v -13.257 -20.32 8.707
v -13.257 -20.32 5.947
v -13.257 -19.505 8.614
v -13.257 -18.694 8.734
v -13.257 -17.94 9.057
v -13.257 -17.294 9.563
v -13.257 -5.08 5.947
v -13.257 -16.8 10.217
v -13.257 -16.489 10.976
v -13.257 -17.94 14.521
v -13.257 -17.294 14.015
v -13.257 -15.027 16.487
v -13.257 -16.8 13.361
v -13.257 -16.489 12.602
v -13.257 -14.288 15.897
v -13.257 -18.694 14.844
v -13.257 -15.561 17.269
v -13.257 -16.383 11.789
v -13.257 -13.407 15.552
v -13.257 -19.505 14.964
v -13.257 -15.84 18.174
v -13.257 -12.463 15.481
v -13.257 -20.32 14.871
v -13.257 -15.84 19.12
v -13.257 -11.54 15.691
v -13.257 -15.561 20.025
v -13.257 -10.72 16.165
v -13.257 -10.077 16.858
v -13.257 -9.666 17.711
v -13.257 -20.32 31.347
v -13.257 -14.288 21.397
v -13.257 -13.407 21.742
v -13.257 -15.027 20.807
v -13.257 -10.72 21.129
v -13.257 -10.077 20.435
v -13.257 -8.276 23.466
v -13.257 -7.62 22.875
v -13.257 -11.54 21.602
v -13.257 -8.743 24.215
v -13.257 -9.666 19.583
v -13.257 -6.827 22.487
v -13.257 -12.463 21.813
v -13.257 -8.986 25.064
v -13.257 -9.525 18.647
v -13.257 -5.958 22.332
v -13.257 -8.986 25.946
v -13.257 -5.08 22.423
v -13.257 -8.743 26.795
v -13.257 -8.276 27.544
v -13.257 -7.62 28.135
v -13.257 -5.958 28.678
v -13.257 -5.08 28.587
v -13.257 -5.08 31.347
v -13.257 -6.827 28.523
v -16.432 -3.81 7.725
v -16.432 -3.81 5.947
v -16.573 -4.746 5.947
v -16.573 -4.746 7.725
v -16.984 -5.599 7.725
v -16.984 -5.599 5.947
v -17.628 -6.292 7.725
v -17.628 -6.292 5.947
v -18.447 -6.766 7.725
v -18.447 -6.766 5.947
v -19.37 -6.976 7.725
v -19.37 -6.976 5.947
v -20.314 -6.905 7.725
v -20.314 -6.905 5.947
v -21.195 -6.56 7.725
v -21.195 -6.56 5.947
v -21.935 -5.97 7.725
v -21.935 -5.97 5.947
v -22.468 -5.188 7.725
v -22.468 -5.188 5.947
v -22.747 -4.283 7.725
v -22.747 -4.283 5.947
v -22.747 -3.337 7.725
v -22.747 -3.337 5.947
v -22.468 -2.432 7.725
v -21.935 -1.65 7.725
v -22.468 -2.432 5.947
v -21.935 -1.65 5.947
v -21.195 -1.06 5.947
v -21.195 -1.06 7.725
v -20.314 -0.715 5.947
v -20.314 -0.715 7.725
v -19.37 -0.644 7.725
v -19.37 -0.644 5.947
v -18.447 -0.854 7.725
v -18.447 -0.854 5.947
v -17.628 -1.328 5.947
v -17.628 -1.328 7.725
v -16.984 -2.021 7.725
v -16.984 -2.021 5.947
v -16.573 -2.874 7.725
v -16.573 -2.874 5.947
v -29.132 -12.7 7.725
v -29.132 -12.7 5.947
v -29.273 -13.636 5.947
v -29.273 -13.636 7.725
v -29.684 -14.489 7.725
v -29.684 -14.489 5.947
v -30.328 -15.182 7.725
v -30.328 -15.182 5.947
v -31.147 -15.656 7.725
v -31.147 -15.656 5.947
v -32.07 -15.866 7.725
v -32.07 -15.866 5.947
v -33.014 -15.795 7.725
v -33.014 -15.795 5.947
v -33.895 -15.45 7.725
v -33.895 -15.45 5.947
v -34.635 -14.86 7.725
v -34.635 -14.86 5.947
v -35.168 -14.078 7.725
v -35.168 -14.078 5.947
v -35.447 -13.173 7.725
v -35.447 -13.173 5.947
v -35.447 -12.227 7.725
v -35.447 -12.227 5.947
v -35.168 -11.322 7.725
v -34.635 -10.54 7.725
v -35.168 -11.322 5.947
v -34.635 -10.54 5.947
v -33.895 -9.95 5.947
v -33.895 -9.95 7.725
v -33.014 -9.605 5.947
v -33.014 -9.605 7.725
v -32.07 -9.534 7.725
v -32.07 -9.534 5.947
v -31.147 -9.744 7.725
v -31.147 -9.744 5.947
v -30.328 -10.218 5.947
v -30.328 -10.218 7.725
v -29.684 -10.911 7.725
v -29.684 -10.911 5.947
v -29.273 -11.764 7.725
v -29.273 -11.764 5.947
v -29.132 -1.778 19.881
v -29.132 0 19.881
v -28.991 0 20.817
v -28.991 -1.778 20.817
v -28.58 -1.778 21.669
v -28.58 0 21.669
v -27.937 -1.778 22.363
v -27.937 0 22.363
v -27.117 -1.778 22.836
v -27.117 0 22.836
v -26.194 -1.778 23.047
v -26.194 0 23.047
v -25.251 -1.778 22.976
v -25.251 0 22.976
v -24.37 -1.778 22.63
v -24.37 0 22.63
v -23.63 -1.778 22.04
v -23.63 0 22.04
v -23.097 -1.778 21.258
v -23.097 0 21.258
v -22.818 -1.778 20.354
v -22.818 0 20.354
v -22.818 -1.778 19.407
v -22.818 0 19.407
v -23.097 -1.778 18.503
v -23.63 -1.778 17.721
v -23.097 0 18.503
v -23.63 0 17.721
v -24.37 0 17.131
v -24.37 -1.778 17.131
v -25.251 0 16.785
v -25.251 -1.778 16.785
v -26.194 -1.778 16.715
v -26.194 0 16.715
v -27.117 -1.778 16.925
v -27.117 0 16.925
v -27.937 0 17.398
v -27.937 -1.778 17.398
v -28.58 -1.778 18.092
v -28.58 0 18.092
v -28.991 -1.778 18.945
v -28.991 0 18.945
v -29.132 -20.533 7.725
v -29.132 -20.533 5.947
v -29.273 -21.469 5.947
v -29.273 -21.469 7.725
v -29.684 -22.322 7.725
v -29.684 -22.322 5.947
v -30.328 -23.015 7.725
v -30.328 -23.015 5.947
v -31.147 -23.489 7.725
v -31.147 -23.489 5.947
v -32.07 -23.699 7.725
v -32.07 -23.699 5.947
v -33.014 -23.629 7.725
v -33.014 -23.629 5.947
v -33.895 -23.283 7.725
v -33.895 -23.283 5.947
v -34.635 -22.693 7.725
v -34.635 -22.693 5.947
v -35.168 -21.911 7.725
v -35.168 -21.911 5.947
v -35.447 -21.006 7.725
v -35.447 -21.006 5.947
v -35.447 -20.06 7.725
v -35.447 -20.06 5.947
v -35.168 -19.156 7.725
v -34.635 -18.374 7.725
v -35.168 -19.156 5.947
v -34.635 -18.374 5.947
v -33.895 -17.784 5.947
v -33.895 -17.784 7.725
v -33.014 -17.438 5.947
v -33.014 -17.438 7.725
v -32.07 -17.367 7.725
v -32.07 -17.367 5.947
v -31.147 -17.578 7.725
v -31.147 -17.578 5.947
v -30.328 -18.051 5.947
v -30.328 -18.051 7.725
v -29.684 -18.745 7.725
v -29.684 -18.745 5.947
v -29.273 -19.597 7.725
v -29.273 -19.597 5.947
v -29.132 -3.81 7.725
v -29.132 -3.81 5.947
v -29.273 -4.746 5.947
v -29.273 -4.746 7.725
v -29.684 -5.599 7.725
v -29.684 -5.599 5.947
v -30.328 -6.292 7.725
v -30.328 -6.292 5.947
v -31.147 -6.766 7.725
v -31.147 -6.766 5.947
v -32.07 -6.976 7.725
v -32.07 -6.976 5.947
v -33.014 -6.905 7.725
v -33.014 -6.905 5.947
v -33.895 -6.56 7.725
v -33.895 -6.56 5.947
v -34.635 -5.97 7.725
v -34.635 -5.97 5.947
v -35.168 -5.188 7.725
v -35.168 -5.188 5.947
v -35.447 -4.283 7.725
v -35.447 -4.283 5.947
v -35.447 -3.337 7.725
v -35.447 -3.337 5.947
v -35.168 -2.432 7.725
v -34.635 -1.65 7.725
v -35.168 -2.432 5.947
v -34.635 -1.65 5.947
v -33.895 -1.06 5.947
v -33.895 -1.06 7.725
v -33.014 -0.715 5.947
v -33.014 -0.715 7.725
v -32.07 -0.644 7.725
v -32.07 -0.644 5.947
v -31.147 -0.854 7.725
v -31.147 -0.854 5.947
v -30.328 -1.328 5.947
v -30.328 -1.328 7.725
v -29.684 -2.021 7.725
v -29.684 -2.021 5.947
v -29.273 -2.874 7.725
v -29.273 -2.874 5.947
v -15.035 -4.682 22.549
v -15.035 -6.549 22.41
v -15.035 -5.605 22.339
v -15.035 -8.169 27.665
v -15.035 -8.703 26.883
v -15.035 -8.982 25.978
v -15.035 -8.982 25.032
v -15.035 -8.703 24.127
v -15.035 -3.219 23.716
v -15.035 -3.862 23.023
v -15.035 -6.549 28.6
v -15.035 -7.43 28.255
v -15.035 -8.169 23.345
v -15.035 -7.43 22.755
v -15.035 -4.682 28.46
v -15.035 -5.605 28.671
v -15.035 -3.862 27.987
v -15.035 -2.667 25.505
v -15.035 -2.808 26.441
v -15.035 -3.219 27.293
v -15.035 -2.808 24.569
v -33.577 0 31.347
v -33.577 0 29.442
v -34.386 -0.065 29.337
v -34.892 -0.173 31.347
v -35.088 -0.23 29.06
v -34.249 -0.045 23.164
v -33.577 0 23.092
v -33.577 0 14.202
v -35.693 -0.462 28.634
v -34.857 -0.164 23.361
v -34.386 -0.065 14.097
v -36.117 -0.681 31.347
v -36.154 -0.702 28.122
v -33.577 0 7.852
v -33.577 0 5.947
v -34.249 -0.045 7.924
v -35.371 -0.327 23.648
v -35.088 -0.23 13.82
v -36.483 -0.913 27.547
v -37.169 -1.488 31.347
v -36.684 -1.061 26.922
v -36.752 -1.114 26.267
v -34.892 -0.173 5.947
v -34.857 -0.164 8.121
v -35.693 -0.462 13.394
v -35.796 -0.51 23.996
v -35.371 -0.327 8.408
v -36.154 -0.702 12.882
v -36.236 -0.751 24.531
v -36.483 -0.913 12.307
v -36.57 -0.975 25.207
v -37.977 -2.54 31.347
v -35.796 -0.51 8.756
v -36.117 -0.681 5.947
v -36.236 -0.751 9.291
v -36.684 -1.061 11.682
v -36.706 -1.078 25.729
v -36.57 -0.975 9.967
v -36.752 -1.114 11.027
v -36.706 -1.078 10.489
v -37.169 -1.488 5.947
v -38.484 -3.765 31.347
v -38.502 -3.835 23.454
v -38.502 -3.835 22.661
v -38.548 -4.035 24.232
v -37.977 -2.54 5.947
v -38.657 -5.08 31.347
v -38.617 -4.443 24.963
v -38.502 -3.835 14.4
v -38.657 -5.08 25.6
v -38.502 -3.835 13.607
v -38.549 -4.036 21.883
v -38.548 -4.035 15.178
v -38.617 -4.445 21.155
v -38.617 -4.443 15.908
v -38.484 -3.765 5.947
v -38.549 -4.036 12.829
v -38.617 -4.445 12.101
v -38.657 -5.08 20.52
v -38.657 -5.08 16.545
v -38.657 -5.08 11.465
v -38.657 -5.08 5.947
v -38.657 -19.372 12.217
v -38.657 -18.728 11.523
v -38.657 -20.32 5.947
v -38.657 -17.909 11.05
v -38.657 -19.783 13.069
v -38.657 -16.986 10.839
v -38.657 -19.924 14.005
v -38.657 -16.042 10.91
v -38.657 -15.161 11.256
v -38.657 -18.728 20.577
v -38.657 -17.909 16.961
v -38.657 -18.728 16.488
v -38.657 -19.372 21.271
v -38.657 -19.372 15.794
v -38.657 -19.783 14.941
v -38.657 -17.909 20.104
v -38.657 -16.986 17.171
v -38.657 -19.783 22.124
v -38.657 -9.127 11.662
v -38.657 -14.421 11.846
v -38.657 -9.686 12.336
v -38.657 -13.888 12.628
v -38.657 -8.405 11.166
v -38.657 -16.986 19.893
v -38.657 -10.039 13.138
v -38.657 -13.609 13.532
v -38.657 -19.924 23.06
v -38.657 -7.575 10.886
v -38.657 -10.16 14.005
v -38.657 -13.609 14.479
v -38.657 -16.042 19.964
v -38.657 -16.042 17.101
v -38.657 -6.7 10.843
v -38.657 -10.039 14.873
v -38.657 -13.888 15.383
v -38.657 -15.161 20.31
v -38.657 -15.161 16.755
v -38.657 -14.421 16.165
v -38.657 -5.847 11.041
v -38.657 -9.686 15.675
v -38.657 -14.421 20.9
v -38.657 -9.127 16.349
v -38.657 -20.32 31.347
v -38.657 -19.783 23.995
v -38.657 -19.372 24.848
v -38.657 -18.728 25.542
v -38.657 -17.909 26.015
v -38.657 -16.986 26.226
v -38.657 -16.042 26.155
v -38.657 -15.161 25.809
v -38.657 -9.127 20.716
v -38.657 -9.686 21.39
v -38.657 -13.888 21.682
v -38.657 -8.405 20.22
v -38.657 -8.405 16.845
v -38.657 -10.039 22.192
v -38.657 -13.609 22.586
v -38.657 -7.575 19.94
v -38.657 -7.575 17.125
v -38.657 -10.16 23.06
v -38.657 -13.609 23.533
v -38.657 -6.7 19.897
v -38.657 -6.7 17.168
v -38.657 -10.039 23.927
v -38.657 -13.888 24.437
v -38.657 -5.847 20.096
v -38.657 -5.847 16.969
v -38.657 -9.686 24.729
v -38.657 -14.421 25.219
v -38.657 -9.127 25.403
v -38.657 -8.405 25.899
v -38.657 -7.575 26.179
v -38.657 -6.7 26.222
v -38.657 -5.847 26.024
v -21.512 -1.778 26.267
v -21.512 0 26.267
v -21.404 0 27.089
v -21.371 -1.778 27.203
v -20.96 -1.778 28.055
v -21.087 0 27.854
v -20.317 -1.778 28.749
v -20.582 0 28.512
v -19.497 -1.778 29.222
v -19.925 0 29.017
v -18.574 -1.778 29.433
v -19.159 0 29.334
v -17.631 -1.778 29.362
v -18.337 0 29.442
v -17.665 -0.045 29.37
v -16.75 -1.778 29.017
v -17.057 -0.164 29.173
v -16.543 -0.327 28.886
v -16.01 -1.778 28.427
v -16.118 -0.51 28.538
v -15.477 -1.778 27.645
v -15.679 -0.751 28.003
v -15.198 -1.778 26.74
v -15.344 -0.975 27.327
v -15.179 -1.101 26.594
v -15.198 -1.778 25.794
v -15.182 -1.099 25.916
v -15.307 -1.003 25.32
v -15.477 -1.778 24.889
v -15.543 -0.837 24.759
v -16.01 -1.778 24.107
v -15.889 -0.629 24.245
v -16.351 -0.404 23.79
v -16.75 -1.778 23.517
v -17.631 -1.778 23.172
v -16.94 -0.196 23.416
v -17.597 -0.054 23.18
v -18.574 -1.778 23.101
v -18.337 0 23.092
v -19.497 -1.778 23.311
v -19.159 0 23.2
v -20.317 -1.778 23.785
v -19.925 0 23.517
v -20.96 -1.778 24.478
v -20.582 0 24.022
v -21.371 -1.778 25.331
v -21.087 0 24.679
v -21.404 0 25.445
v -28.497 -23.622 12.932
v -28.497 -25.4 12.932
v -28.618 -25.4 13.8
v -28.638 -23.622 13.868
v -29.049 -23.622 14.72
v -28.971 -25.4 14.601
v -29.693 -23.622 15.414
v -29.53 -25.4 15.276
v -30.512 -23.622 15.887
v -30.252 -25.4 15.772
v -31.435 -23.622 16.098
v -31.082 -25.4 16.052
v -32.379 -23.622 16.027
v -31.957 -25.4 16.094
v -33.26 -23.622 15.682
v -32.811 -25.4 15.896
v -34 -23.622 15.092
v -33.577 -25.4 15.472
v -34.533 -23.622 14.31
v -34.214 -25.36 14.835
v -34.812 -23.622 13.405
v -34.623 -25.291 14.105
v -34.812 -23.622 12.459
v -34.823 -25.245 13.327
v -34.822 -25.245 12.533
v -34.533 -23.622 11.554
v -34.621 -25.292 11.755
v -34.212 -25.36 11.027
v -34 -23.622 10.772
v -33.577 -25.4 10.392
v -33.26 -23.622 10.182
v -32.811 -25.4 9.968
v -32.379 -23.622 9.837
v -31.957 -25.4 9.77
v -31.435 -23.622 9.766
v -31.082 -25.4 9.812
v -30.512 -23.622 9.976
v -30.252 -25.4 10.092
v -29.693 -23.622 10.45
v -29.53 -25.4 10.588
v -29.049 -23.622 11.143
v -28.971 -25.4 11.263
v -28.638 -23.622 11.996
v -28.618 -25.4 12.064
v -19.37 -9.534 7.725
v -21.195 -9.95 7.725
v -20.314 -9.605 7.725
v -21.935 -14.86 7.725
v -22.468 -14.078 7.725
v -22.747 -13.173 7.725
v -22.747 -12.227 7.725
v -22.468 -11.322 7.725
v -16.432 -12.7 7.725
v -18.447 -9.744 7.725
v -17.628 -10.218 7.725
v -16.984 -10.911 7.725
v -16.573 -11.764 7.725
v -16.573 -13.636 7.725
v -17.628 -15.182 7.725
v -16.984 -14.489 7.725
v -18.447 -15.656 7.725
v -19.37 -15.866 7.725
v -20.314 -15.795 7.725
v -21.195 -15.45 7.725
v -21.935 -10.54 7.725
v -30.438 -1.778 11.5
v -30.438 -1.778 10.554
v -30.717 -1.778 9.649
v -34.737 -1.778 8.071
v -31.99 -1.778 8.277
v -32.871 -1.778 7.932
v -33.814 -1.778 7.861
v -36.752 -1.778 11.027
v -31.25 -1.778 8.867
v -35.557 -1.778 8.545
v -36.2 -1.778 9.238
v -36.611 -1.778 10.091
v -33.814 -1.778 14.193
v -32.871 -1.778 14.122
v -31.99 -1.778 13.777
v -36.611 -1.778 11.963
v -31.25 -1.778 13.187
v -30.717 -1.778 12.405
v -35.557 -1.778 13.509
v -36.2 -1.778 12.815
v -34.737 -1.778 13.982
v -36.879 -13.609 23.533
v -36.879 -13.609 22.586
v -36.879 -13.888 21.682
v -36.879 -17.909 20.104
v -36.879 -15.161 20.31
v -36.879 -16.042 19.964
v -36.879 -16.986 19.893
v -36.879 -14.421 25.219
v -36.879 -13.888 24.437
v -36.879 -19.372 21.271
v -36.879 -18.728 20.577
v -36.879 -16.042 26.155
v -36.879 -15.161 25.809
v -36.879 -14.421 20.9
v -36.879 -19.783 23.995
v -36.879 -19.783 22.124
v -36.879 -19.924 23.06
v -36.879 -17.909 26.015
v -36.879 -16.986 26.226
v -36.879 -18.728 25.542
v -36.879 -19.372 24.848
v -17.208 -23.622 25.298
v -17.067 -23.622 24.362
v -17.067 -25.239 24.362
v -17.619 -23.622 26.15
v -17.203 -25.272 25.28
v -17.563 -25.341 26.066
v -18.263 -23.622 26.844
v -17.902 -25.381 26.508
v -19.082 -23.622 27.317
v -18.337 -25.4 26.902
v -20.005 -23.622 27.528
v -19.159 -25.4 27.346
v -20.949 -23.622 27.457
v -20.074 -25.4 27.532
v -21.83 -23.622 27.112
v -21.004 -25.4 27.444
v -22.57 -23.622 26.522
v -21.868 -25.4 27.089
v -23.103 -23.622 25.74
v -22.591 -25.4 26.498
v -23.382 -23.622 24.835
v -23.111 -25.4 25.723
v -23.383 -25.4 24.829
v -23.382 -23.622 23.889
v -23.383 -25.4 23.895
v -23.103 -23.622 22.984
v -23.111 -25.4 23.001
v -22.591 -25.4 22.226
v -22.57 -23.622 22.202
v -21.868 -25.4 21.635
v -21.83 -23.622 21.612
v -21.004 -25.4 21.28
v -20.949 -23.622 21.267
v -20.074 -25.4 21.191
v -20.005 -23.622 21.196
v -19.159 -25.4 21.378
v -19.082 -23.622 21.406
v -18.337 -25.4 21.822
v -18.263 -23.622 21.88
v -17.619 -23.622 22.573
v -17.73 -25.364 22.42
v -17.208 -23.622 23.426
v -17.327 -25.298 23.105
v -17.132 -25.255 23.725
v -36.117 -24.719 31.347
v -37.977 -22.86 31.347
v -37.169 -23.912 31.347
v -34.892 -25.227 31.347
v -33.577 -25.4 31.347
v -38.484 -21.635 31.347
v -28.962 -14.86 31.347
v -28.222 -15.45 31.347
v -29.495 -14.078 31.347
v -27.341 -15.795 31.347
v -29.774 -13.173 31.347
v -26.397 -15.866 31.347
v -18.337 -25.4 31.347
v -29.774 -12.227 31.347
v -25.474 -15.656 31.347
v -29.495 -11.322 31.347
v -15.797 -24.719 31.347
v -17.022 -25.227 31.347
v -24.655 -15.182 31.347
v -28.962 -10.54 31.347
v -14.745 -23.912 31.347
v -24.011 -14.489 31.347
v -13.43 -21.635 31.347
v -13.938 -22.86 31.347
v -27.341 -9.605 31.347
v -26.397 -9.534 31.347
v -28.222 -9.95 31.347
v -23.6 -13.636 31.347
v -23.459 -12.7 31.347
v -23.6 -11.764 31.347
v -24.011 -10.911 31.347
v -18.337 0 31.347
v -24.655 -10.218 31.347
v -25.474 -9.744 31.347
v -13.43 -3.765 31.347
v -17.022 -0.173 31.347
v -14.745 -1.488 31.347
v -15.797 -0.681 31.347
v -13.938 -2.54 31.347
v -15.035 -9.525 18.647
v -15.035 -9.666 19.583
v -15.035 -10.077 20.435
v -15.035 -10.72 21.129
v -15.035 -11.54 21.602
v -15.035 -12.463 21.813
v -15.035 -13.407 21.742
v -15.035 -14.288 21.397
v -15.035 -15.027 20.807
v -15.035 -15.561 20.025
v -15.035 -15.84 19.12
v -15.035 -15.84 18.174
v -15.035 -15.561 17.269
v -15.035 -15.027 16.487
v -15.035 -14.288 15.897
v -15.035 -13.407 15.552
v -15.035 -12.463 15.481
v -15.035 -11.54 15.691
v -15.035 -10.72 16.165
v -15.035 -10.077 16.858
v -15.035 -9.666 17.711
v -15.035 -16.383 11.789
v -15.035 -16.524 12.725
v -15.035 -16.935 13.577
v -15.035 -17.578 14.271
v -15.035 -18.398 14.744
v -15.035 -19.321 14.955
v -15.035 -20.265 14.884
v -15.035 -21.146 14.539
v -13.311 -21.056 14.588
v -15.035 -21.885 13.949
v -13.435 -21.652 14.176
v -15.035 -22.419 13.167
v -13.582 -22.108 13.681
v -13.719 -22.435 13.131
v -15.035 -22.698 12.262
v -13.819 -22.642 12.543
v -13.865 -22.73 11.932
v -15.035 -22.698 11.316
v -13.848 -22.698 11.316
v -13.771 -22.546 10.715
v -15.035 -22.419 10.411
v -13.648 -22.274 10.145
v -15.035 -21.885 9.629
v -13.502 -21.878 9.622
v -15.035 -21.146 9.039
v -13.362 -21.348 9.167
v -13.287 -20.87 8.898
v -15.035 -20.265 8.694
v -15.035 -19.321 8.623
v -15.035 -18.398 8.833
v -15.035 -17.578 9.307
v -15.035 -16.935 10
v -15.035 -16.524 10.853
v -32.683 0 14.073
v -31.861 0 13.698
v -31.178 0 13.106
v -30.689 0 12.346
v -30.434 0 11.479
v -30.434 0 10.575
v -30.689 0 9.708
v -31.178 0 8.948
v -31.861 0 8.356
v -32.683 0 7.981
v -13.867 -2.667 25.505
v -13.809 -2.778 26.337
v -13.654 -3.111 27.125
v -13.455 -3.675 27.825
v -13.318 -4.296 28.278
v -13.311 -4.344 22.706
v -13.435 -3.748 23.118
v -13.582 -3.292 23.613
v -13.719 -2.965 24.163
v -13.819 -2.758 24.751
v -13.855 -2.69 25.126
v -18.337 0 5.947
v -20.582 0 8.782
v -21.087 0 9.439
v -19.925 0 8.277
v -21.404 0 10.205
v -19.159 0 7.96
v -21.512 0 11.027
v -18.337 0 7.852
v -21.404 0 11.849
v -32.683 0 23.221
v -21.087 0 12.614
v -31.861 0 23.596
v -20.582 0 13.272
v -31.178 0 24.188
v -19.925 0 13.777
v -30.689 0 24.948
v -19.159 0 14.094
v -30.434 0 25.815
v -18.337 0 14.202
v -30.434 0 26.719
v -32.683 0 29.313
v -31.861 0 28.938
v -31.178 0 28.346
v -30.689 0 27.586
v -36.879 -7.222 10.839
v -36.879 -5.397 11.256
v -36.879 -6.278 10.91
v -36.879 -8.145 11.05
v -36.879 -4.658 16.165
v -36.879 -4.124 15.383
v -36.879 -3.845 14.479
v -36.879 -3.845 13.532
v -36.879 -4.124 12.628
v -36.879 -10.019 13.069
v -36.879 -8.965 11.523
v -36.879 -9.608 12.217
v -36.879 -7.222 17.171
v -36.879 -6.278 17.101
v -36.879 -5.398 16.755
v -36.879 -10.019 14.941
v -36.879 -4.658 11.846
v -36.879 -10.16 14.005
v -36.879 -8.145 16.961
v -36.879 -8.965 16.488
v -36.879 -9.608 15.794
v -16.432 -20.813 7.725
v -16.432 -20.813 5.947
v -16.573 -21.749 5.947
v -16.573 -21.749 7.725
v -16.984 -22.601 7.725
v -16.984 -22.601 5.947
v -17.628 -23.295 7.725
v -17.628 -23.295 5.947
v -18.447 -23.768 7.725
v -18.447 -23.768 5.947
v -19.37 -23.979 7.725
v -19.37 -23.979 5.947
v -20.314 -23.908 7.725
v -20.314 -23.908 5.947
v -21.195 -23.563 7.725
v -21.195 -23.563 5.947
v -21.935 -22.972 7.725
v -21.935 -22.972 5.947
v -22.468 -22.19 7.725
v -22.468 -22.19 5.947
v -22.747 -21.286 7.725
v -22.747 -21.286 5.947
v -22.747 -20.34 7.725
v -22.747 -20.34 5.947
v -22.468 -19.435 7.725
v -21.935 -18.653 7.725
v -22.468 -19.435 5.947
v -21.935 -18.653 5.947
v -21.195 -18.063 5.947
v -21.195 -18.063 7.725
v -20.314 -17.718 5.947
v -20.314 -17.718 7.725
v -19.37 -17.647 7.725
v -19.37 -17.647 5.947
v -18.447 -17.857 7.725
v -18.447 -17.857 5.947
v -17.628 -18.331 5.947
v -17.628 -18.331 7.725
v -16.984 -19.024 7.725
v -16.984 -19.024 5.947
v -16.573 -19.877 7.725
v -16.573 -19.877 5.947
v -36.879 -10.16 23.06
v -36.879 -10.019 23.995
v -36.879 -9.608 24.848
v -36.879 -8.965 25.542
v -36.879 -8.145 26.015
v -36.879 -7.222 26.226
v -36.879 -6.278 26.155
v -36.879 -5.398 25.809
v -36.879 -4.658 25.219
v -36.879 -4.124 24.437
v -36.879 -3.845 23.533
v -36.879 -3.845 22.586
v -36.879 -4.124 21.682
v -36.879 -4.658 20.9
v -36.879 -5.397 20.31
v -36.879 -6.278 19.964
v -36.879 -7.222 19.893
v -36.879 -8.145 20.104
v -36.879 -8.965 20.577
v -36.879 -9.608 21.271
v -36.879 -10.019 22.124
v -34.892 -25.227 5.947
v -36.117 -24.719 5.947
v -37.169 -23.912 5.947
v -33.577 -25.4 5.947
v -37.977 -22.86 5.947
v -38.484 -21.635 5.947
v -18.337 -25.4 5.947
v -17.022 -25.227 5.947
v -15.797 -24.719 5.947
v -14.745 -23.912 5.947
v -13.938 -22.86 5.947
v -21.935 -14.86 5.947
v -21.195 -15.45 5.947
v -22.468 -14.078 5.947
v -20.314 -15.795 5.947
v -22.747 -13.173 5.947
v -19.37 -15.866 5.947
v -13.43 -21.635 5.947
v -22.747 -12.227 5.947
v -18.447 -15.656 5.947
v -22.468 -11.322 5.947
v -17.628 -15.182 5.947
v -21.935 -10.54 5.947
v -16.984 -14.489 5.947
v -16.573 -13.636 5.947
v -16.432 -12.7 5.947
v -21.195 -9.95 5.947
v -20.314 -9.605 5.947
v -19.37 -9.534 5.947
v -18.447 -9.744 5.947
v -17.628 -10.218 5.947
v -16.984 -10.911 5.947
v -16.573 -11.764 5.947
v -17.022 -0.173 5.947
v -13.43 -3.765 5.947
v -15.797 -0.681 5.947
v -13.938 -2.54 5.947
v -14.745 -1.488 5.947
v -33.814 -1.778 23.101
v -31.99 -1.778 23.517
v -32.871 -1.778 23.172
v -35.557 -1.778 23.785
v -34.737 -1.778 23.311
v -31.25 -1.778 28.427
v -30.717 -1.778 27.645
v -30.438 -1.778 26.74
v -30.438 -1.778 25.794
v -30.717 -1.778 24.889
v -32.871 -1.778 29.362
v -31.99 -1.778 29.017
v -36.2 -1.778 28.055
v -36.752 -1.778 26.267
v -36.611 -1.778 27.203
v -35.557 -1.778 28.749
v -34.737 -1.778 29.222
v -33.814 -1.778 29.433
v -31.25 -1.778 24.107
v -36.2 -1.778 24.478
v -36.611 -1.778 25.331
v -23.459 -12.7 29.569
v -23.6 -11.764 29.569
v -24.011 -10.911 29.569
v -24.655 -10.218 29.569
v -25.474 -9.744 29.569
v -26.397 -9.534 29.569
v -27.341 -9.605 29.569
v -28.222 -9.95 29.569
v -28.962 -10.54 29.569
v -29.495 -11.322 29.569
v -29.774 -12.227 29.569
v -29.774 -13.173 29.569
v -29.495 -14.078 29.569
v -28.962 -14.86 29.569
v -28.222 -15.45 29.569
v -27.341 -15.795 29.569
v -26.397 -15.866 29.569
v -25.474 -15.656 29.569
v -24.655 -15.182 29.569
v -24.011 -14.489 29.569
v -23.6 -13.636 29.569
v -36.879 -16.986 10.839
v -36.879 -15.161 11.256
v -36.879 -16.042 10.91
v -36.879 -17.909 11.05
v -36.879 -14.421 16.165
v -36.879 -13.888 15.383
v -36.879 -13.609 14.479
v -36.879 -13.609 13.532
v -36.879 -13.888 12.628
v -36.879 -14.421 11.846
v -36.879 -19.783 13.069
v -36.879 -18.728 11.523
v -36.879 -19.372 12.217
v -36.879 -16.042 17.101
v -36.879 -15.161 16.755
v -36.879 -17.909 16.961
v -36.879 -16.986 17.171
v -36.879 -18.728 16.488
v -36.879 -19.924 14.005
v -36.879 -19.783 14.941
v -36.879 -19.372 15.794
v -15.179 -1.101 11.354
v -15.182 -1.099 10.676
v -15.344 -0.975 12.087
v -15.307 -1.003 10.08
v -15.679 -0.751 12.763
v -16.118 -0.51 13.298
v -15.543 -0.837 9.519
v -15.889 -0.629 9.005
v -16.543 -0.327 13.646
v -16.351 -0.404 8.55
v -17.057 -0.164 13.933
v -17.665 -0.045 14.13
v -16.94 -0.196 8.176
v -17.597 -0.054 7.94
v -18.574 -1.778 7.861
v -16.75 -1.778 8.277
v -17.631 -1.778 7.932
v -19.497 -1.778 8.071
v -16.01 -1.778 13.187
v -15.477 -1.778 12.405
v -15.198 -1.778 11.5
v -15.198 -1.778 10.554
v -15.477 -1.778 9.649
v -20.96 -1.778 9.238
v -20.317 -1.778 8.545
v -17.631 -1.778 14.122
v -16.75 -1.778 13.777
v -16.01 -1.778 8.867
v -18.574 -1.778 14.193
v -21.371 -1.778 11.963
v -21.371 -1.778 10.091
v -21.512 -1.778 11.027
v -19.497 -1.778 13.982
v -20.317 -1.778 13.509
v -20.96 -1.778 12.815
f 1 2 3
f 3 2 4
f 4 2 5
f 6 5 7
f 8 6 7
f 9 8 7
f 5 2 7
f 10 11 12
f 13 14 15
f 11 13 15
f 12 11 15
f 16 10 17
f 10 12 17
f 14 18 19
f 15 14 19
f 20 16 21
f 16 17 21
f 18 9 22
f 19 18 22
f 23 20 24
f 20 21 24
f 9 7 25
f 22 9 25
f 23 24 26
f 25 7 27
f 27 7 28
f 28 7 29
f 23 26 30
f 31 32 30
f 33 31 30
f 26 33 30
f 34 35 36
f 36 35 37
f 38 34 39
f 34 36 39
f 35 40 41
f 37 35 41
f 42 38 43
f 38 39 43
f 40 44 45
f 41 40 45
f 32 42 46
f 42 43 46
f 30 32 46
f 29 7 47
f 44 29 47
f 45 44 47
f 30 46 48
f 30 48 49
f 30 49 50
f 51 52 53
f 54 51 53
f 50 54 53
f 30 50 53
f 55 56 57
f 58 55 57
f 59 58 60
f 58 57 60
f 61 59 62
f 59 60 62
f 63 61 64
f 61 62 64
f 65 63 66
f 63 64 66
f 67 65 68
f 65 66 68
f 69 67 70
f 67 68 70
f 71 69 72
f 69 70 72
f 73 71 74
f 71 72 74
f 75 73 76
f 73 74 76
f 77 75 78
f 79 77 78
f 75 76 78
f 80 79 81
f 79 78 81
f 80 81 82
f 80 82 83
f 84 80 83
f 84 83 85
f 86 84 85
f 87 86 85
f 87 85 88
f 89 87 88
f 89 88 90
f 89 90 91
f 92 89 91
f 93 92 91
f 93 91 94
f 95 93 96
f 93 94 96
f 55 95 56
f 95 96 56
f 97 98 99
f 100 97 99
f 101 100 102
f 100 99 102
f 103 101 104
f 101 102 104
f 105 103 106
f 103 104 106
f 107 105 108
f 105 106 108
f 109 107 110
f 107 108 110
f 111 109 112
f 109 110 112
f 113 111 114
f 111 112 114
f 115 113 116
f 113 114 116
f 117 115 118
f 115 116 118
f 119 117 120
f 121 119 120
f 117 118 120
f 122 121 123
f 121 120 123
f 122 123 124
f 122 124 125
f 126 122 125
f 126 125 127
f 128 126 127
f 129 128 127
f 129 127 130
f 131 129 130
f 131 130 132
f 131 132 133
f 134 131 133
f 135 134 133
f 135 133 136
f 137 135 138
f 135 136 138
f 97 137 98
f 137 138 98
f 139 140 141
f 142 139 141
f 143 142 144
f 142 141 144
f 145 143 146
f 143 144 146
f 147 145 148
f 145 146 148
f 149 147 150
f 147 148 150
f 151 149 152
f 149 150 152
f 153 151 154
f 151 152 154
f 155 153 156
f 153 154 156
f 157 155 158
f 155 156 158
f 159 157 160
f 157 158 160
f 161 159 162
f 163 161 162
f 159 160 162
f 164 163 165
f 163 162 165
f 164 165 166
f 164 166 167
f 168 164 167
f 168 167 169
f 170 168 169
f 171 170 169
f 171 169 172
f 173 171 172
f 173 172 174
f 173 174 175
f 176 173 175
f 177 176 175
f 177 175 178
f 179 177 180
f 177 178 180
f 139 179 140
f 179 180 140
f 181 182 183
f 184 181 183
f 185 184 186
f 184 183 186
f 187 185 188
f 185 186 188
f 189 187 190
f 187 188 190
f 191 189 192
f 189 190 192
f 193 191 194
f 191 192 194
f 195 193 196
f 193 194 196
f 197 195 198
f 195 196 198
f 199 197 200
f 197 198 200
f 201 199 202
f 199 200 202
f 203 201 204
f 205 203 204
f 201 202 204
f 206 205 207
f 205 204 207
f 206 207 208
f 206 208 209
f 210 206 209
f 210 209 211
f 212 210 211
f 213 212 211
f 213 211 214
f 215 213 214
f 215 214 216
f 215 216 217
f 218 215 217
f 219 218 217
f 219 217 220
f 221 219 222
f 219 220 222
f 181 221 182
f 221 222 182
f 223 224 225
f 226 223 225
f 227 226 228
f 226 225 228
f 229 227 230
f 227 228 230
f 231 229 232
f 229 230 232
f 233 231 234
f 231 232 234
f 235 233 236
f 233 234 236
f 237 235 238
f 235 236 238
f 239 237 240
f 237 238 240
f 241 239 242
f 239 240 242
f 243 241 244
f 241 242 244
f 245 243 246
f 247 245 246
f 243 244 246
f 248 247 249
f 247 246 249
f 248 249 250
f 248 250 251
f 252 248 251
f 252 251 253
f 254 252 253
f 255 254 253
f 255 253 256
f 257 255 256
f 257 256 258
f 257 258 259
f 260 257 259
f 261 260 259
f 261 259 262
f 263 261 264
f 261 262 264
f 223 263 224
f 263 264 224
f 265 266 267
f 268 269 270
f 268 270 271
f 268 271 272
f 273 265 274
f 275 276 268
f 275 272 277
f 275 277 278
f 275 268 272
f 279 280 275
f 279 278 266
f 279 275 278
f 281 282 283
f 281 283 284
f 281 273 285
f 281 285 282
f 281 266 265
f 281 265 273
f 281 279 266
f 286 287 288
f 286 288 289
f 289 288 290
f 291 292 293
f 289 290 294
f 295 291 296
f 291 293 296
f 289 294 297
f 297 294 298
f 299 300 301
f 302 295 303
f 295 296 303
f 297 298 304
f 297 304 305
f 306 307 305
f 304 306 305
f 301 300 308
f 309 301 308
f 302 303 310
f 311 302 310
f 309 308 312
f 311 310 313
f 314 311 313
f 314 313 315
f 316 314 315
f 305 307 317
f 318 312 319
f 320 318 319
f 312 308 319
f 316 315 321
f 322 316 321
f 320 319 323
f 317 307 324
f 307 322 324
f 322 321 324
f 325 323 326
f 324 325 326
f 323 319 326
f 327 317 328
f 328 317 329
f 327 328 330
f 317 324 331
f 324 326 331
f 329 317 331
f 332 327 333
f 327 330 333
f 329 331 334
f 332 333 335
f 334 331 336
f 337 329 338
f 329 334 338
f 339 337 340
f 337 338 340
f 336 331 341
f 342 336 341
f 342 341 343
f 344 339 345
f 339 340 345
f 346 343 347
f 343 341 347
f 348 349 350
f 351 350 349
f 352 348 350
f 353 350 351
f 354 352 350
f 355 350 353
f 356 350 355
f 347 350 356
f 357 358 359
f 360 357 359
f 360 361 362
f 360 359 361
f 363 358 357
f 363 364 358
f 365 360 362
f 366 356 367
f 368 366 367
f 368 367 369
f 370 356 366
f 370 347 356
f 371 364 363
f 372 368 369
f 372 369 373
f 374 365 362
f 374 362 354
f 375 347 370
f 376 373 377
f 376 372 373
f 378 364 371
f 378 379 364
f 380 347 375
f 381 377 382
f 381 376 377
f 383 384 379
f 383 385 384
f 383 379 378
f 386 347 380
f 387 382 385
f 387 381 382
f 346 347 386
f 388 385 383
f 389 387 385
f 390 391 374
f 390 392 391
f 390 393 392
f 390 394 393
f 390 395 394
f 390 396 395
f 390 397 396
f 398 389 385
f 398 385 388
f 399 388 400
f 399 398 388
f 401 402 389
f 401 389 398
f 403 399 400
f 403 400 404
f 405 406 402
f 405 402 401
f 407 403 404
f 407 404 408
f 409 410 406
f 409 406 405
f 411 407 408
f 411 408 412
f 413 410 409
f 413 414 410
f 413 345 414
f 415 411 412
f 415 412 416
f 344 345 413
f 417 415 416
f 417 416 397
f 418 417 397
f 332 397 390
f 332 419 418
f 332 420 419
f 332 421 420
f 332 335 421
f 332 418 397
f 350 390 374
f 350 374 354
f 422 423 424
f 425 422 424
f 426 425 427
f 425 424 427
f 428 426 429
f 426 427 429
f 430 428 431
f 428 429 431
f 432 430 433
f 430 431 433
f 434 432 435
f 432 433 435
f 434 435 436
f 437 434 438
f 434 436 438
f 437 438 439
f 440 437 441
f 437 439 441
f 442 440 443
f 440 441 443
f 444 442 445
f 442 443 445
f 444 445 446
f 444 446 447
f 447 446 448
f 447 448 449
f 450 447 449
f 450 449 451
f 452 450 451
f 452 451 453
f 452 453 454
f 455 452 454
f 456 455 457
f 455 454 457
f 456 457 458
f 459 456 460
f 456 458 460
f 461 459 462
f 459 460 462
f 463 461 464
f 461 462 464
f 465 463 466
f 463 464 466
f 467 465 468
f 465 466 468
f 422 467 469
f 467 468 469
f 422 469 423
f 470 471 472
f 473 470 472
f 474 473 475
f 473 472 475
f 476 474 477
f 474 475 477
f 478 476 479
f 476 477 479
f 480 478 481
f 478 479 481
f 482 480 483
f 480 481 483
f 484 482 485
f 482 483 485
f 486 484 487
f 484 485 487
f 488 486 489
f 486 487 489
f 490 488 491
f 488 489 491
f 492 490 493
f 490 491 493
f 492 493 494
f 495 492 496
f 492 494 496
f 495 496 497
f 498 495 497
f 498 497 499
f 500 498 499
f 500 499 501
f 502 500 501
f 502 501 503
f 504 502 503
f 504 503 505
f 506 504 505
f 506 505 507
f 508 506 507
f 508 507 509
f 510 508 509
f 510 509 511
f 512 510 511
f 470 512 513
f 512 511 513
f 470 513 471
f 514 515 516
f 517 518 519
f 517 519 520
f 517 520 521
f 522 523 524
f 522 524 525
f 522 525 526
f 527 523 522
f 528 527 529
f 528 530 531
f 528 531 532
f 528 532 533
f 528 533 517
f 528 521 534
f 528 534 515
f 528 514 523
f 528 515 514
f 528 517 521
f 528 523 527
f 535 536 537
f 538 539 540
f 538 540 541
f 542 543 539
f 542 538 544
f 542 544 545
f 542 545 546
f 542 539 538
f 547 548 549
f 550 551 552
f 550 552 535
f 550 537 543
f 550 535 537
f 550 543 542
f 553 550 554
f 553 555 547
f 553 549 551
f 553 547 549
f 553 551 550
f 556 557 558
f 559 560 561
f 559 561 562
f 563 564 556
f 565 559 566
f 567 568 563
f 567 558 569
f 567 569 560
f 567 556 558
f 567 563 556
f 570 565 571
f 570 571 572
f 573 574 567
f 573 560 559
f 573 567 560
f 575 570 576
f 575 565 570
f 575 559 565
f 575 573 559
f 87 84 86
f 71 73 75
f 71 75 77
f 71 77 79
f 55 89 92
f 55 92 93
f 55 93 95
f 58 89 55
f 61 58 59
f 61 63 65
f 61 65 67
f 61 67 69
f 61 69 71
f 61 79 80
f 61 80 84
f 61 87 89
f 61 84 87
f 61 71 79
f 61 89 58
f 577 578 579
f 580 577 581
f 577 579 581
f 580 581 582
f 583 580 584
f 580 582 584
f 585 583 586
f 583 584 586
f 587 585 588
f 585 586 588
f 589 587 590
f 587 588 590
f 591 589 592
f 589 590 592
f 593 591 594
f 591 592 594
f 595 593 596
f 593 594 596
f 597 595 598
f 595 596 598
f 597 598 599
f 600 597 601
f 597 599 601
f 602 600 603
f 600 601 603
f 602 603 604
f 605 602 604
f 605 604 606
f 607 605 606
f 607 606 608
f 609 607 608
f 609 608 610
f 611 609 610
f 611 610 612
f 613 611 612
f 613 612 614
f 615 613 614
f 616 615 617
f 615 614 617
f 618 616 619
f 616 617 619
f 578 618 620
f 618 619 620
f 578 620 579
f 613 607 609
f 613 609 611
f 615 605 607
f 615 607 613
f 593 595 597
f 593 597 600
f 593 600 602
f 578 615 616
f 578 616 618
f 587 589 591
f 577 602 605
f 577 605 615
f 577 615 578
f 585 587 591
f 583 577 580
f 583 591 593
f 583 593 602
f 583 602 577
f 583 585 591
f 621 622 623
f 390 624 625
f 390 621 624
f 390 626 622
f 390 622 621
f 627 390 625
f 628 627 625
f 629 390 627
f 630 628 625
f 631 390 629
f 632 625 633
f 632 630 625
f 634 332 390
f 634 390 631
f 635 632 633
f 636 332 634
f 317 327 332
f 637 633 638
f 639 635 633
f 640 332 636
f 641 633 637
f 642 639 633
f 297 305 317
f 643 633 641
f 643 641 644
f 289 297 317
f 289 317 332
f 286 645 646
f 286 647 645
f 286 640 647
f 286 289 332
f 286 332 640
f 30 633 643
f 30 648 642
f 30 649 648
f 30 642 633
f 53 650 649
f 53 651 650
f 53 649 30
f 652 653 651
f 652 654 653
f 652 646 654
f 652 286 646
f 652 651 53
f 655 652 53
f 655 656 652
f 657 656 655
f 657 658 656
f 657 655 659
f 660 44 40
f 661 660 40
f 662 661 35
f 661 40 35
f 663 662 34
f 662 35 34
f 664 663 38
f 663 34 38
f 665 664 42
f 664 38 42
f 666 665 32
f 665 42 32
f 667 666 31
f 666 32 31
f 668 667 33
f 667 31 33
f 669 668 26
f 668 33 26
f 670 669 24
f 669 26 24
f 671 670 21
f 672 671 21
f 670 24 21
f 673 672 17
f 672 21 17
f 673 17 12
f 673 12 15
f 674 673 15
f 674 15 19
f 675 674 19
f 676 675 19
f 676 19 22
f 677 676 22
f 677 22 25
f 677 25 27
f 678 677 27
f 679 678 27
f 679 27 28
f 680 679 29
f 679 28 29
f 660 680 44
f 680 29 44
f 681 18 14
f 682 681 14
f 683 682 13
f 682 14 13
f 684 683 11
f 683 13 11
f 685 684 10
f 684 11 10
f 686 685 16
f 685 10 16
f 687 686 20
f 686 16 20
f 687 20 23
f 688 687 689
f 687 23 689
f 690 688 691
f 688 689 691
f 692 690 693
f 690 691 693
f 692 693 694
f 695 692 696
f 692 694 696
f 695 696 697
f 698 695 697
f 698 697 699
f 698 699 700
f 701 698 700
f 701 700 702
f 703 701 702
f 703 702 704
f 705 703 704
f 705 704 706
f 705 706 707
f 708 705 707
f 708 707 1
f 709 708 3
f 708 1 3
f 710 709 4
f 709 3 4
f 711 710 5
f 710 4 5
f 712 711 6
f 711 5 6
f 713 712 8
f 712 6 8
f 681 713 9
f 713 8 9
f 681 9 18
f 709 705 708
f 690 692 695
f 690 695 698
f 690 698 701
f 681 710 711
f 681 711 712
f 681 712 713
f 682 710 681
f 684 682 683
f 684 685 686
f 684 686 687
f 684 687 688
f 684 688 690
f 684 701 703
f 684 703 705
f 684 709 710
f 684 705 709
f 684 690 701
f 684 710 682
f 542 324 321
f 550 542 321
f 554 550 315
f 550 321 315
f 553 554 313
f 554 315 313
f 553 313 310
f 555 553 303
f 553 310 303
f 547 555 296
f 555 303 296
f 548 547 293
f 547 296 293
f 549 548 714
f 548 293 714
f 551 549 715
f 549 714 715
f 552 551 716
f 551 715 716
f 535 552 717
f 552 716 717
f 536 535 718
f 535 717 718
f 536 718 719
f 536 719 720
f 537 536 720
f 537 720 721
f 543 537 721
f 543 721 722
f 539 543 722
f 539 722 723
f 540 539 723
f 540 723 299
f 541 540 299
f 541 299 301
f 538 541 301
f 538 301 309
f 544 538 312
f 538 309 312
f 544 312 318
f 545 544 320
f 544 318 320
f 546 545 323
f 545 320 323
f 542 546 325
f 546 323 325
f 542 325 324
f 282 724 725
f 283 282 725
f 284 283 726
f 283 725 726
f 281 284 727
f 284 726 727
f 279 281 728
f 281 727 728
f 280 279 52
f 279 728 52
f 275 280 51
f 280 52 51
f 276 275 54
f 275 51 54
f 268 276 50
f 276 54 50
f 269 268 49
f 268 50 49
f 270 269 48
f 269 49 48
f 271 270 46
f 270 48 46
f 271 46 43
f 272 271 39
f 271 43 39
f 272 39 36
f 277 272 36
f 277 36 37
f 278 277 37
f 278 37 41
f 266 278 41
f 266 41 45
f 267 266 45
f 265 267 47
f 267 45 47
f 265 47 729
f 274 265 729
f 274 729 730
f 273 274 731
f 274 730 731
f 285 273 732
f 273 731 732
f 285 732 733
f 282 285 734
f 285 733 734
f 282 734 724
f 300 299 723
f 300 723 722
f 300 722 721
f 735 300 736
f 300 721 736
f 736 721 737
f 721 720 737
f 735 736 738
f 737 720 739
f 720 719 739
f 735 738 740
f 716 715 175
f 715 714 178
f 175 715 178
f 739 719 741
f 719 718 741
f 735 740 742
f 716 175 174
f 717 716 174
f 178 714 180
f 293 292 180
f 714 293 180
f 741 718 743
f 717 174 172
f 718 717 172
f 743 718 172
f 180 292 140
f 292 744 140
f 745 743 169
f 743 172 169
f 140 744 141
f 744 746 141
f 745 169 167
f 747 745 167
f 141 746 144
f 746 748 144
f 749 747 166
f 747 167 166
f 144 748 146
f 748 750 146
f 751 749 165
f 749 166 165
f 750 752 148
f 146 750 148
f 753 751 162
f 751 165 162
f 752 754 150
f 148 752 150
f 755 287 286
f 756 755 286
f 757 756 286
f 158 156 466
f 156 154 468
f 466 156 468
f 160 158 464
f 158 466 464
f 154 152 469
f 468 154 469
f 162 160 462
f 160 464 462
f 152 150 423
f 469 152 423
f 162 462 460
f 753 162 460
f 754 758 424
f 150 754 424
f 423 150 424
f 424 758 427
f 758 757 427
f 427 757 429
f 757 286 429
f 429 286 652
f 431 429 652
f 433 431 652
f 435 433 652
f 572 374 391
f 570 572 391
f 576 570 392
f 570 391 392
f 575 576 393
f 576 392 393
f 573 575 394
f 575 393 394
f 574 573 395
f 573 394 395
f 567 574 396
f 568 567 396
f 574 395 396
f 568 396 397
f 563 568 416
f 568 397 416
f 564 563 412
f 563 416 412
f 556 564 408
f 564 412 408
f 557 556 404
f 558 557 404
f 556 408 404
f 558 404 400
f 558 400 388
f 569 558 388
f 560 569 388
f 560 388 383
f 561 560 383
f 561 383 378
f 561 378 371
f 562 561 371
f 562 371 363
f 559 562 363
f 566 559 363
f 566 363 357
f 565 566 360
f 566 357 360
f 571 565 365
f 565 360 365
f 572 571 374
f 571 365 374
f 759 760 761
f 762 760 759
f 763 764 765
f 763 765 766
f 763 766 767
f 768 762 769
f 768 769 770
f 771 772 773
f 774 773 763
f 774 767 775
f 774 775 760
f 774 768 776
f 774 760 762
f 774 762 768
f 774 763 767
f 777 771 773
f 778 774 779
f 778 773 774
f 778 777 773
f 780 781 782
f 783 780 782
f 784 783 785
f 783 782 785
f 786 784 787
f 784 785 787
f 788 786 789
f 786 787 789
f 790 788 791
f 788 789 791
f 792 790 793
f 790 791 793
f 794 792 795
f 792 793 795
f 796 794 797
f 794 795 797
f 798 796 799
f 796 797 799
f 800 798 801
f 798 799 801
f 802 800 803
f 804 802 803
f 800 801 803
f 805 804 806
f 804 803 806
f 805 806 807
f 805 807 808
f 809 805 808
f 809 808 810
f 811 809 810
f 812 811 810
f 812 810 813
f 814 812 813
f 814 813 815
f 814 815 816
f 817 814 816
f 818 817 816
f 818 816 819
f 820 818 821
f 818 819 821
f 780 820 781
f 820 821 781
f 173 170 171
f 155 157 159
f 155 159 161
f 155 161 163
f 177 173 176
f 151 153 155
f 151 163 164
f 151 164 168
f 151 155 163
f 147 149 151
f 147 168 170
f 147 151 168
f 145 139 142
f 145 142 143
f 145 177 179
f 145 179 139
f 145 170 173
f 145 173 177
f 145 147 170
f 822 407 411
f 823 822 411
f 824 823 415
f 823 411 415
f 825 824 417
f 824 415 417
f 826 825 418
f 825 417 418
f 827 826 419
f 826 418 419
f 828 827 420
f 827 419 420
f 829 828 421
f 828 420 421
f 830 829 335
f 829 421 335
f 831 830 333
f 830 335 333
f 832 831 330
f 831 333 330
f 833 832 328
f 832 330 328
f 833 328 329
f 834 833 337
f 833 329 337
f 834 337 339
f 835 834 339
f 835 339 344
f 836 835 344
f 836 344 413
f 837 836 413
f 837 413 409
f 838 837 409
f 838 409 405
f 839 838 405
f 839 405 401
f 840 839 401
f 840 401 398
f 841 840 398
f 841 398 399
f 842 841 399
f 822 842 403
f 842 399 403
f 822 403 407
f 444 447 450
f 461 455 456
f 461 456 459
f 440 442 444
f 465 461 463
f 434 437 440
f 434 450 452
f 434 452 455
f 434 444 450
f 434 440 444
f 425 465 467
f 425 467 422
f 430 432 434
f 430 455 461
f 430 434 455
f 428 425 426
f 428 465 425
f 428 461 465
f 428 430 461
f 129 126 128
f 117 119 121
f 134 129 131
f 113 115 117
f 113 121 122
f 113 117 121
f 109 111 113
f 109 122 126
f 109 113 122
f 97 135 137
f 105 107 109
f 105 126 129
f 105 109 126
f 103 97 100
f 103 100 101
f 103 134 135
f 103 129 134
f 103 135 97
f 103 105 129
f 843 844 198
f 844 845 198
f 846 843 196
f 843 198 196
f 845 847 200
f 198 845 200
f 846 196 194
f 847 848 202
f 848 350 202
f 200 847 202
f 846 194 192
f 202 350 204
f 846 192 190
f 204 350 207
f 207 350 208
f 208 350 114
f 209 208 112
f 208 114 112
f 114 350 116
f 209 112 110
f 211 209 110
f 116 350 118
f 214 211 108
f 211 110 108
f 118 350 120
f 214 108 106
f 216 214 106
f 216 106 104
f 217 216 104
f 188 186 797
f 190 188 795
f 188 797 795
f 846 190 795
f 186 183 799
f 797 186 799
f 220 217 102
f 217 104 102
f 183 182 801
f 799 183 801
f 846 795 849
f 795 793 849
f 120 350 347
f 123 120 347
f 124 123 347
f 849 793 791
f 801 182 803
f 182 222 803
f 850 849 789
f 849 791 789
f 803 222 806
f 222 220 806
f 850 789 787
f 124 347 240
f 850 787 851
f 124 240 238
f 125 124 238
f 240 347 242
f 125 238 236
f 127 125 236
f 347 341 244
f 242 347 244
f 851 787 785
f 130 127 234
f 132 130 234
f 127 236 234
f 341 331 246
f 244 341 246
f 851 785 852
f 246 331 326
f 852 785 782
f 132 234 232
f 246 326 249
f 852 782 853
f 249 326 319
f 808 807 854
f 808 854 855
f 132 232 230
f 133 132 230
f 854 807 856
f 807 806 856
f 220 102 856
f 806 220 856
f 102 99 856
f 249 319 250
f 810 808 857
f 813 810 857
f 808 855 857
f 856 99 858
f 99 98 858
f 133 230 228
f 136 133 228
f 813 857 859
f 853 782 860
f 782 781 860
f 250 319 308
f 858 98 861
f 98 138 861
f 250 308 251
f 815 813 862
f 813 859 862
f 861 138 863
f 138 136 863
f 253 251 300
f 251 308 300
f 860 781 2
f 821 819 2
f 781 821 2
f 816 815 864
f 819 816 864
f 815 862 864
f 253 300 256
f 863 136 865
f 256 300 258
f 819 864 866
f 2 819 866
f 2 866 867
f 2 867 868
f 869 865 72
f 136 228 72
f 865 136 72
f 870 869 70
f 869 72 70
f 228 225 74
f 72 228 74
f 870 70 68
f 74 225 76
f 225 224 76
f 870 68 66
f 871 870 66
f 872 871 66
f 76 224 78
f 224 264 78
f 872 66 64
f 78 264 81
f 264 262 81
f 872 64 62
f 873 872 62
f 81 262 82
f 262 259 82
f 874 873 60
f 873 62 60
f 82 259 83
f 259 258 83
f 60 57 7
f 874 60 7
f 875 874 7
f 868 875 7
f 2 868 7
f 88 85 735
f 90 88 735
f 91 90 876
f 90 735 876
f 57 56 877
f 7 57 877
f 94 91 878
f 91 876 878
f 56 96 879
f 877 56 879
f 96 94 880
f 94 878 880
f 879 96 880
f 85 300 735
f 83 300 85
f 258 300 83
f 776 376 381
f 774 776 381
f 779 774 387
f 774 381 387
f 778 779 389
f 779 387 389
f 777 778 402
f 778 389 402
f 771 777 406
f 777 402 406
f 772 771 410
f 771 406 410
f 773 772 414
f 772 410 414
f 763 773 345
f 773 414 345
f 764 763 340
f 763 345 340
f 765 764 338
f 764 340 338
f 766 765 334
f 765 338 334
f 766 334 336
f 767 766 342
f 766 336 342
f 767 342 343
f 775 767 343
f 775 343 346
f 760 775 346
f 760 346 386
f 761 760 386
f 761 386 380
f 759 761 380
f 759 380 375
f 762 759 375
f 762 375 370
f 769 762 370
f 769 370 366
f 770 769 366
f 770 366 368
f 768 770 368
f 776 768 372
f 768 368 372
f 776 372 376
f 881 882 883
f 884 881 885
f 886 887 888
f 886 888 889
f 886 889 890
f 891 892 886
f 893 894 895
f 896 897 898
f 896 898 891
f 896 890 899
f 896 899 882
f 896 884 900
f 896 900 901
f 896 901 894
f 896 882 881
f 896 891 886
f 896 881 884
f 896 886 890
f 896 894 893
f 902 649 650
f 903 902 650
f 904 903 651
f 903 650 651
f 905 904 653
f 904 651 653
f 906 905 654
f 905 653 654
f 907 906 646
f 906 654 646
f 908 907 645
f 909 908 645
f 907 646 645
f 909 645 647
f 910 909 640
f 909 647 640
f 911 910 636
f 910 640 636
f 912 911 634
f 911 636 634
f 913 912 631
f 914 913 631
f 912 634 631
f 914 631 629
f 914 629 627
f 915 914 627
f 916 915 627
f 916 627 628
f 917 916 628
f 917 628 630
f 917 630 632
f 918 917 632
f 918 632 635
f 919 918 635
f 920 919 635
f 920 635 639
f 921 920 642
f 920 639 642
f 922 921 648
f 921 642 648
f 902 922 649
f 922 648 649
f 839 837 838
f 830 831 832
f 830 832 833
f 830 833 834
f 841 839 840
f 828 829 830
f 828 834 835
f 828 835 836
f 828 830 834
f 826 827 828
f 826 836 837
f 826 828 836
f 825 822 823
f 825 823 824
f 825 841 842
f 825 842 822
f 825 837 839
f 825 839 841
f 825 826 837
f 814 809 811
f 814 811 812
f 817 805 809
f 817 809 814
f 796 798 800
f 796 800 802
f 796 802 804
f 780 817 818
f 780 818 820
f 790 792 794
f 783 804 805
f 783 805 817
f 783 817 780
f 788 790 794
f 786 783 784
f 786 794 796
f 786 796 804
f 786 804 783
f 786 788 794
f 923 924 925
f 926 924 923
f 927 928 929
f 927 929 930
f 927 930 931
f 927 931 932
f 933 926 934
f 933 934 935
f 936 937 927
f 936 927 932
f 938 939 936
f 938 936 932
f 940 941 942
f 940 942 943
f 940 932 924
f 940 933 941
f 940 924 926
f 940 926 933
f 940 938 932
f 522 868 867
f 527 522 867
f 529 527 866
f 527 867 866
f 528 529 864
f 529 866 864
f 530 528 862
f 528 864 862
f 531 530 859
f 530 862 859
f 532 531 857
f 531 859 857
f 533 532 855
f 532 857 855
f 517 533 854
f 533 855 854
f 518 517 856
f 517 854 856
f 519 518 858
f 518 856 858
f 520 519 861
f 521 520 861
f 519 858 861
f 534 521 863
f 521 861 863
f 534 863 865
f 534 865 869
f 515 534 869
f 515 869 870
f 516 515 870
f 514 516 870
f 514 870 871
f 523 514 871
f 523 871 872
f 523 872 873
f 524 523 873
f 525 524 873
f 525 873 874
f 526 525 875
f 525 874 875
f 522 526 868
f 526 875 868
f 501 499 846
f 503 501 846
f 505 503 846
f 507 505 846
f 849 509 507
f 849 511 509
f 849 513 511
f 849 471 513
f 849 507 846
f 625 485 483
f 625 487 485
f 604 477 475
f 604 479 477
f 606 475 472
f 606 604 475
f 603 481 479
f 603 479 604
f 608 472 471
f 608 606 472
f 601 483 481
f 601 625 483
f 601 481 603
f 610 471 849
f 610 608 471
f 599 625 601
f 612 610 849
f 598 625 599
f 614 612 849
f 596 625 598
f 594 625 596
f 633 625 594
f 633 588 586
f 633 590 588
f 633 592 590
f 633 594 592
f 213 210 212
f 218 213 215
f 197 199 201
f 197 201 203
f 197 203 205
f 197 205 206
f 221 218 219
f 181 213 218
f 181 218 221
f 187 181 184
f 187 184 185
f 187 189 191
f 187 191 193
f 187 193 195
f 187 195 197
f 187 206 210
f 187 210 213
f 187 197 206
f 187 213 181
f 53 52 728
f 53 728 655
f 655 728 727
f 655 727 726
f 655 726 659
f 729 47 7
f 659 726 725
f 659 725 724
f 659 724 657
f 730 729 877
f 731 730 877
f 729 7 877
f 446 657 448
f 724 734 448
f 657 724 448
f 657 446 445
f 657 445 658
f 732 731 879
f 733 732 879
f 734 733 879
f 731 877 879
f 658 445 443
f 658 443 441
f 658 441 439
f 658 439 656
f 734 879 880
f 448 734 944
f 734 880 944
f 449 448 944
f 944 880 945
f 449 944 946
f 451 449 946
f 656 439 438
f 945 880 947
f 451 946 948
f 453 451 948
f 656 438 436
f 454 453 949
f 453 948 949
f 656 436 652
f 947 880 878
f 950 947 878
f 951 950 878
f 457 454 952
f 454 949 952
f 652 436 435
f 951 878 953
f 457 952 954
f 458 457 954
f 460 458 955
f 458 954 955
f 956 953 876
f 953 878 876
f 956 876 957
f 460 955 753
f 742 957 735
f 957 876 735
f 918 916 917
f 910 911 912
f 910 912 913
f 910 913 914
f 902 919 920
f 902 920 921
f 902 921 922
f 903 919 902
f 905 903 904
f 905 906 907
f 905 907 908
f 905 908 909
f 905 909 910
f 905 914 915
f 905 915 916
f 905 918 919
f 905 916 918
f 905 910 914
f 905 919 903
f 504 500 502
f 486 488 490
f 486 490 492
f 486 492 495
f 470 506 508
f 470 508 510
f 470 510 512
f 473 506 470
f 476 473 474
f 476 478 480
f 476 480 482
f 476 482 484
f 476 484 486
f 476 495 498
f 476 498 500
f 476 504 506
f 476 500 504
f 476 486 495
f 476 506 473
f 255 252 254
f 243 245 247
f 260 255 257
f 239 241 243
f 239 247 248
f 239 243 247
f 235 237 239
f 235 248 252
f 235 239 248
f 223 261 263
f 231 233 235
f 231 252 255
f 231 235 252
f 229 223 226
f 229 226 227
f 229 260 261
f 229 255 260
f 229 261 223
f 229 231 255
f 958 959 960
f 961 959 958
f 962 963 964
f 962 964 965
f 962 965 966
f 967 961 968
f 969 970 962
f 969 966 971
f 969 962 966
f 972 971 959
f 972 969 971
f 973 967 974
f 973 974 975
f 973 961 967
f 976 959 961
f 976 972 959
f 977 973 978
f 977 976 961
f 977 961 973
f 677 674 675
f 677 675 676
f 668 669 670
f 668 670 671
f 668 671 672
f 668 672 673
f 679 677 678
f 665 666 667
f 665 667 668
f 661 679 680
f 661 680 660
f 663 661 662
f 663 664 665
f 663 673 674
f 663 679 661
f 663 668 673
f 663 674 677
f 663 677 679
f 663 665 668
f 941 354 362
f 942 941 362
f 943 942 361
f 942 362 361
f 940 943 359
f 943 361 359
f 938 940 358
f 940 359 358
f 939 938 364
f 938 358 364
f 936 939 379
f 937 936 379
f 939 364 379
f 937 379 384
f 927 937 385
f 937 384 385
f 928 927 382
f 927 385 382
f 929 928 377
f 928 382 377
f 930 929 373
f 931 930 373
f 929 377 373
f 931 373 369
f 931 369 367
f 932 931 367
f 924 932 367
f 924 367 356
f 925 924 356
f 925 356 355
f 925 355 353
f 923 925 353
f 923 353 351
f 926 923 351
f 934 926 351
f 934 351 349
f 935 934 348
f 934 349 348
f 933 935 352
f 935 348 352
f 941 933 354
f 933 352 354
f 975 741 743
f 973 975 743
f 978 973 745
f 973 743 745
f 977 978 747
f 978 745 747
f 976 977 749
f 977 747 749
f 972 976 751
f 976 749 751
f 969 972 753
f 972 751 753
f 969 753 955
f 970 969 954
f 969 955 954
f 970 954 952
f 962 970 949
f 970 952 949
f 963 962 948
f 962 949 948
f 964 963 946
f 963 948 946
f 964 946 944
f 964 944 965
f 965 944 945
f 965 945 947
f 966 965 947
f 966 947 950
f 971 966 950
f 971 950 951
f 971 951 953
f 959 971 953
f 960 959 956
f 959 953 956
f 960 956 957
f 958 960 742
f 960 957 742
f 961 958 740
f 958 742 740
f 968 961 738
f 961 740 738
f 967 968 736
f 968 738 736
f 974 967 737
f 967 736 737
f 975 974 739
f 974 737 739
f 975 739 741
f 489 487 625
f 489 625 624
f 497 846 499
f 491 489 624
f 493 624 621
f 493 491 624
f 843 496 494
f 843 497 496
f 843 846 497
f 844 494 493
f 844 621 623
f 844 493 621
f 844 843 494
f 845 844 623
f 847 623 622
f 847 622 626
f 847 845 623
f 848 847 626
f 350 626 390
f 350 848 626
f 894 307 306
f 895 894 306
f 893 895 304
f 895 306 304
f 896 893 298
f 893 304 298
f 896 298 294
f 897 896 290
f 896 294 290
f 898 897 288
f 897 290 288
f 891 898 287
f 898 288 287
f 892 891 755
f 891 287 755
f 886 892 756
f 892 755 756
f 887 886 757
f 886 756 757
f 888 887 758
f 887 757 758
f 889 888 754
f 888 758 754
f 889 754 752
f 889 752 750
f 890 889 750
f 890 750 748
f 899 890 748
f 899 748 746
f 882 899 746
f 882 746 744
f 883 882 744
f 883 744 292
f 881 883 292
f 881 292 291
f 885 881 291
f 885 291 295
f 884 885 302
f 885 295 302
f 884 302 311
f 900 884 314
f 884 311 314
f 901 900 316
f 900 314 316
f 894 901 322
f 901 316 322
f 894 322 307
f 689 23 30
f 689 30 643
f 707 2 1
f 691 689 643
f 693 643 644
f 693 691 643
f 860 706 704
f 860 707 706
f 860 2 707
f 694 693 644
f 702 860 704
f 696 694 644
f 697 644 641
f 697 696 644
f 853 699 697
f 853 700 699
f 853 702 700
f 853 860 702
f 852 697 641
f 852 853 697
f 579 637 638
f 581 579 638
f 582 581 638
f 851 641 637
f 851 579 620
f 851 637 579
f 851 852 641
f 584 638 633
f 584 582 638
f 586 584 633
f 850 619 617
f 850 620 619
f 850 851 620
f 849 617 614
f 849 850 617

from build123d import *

# Parameters (mm, degrees)
F0_W         = 25.4
F0_H         = 25.4
F1_DEPTH     = 25.4
F2_R         = 3.175
F9_DEPTH     = 1.778
F3_R         = 3.175
F10_DEPTH    = 1.778
F4_R         = 3.175
F11_DEPTH    = 1.778
F5_R         = 3.175
F12_DEPTH    = 1.778
F6_R         = 3.175
F13_DEPTH    = 1.778
F7_R         = 3.175
F14_DEPTH    = 1.778
F8_R         = 3.175
F15_DEPTH    = 1.778
F16_T1_DEPTH = 50.8


# Not quite as in the source:
# - a fillet or chamfer that OpenCascade refuses, or shapes differently, is made with other operations: its cross-section is extruded or revolved along the edge and cut away or added


with BuildPart() as f1:
    # F0 (on Front) → F1 (new body)
    with BuildSketch(Plane.XZ):
        with Locations((-25.9571580286, 18.6469587497)):
            Rectangle(F0_W, F0_H)
    extrude(amount=F1_DEPTH)

    # F2 (on face) → F9 (cut)
    with BuildSketch(Plane.XZ.offset(25.4)):
        with Locations((-31.6721580286, 12.9319587497)):
            Circle(F2_R)
    extrude(amount=-F9_DEPTH, mode=Mode.SUBTRACT)

    # F3 (on face) → F10 (cut)
    with BuildSketch(Plane.XZ.offset(25.4)):
        with Locations((-20.2421580286, 24.3619587497)):
            Circle(F3_R)
    extrude(amount=-F10_DEPTH, mode=Mode.SUBTRACT)

    # F4 (on face) → F11 (cut)
    with BuildSketch(Plane.XY.offset(31.3469587497)):
        with Locations((-26.6341753304, -12.7)):
            Circle(F4_R)
    extrude(amount=-F11_DEPTH, mode=Mode.SUBTRACT)

    # F5 (on face) → F12 (cut)
    with BuildSketch(Plane(origin=(-38.6571580286, 0, 0), x_dir=(0, -1, 0), z_dir=(-1, 0, 0))):
        with Locations((16.7485739568, 23.0596062836)):
            Circle(F5_R)
        with Locations((16.7485739568, 14.0053418102)):
            Circle(F5_R)
        with Locations((6.985, 23.0596062836)):
            Circle(F5_R)
        with Locations((6.985, 14.0053418102)):
            Circle(F5_R)
    extrude(amount=-F12_DEPTH, mode=Mode.SUBTRACT)

    # F6 (on face) → F13 (cut)
    with BuildSketch(Plane.YZ.offset(-13.2571580286)):
        with Locations((-12.7, 18.6469587497)):
            Circle(F6_R)
        with Locations((-19.558, 11.7889587497)):
            Circle(F6_R)
        with Locations((-5.842, 25.5049587497)):
            Circle(F6_R)
    extrude(amount=-F13_DEPTH, mode=Mode.SUBTRACT)

    # F7 (on face) → F14 (cut)
    with BuildSketch(Plane(origin=(0, 0, 5.9469587497), x_dir=(1, 0, 0), z_dir=(0, 0, -1))):
        with Locations((-32.3071580286, 12.7)):
            Circle(F7_R)
        with Locations((-19.6071580286, 12.7)):
            Circle(F7_R)
        with Locations((-32.3071580286, 20.5331463367)):
            Circle(F7_R)
        with Locations((-32.3071580286, 3.81)):
            Circle(F7_R)
        with Locations((-19.6071580286, 3.81)):
            Circle(F7_R)
        with Locations((-19.6071580286, 20.8129025996)):
            Circle(F7_R)
    extrude(amount=-F14_DEPTH, mode=Mode.SUBTRACT)

    # F8 (on face) → F15 (cut)
    with BuildSketch(Plane(origin=(0, 0, 0), x_dir=(-1, 0, 0), z_dir=(0, 1, 0))):
        with Locations((25.9571580286, 19.88068223)):
            Circle(F8_R)
        with Locations((18.3371580286, 26.2669587497)):
            Circle(F8_R)
        with Locations((18.3371580286, 11.0269587497)):
            Circle(F8_R)
        with Locations((33.5771580286, 11.0269587497)):
            Circle(F8_R)
        with Locations((33.5771580286, 26.2669587497)):
            Circle(F8_R)
    extrude(amount=-F15_DEPTH, mode=Mode.SUBTRACT)

    # F16: fillet of radius 5.08 on 4 edges, made by hand

    # F16_s2 → F16_t1 (cut)
    with BuildSketch(Plane.XY.offset(-6.7530412503)):
        with BuildLine():
            ThreePointArc((-33.5771580286, -25.4), (-37.1692604771, -23.9121024484), (-38.6571580286, -20.32))
            Line((-38.6571580286, -20.32), (-38.6571580286, -25.4))
            Line((-38.6571580286, -25.4), (-33.5771580286, -25.4))
        make_face()
        with BuildLine():
            ThreePointArc((-13.2571580286, -20.32), (-14.7450555802, -23.9121024484), (-18.3371580286, -25.4))
            Line((-18.3371580286, -25.4), (-13.2571580286, -25.4))
            Line((-13.2571580286, -25.4), (-13.2571580286, -20.32))
        make_face()
        with BuildLine():
            ThreePointArc((-13.2571580286, -5.08), (-14.7450555802, -1.4878975516), (-18.3371580286, 0))
            Line((-18.3371580286, 0), (-13.2571580286, 0))
            Line((-13.2571580286, 0), (-13.2571580286, -5.08))
        make_face()
        with BuildLine():
            ThreePointArc((-33.5771580286, 0), (-37.1692604771, -1.4878975516), (-38.6571580286, -5.08))
            Line((-38.6571580286, -5.08), (-38.6571580286, 0))
            Line((-38.6571580286, 0), (-33.5771580286, 0))
        make_face()
    extrude(amount=F16_T1_DEPTH, mode=Mode.SUBTRACT)


solid = f1.part
